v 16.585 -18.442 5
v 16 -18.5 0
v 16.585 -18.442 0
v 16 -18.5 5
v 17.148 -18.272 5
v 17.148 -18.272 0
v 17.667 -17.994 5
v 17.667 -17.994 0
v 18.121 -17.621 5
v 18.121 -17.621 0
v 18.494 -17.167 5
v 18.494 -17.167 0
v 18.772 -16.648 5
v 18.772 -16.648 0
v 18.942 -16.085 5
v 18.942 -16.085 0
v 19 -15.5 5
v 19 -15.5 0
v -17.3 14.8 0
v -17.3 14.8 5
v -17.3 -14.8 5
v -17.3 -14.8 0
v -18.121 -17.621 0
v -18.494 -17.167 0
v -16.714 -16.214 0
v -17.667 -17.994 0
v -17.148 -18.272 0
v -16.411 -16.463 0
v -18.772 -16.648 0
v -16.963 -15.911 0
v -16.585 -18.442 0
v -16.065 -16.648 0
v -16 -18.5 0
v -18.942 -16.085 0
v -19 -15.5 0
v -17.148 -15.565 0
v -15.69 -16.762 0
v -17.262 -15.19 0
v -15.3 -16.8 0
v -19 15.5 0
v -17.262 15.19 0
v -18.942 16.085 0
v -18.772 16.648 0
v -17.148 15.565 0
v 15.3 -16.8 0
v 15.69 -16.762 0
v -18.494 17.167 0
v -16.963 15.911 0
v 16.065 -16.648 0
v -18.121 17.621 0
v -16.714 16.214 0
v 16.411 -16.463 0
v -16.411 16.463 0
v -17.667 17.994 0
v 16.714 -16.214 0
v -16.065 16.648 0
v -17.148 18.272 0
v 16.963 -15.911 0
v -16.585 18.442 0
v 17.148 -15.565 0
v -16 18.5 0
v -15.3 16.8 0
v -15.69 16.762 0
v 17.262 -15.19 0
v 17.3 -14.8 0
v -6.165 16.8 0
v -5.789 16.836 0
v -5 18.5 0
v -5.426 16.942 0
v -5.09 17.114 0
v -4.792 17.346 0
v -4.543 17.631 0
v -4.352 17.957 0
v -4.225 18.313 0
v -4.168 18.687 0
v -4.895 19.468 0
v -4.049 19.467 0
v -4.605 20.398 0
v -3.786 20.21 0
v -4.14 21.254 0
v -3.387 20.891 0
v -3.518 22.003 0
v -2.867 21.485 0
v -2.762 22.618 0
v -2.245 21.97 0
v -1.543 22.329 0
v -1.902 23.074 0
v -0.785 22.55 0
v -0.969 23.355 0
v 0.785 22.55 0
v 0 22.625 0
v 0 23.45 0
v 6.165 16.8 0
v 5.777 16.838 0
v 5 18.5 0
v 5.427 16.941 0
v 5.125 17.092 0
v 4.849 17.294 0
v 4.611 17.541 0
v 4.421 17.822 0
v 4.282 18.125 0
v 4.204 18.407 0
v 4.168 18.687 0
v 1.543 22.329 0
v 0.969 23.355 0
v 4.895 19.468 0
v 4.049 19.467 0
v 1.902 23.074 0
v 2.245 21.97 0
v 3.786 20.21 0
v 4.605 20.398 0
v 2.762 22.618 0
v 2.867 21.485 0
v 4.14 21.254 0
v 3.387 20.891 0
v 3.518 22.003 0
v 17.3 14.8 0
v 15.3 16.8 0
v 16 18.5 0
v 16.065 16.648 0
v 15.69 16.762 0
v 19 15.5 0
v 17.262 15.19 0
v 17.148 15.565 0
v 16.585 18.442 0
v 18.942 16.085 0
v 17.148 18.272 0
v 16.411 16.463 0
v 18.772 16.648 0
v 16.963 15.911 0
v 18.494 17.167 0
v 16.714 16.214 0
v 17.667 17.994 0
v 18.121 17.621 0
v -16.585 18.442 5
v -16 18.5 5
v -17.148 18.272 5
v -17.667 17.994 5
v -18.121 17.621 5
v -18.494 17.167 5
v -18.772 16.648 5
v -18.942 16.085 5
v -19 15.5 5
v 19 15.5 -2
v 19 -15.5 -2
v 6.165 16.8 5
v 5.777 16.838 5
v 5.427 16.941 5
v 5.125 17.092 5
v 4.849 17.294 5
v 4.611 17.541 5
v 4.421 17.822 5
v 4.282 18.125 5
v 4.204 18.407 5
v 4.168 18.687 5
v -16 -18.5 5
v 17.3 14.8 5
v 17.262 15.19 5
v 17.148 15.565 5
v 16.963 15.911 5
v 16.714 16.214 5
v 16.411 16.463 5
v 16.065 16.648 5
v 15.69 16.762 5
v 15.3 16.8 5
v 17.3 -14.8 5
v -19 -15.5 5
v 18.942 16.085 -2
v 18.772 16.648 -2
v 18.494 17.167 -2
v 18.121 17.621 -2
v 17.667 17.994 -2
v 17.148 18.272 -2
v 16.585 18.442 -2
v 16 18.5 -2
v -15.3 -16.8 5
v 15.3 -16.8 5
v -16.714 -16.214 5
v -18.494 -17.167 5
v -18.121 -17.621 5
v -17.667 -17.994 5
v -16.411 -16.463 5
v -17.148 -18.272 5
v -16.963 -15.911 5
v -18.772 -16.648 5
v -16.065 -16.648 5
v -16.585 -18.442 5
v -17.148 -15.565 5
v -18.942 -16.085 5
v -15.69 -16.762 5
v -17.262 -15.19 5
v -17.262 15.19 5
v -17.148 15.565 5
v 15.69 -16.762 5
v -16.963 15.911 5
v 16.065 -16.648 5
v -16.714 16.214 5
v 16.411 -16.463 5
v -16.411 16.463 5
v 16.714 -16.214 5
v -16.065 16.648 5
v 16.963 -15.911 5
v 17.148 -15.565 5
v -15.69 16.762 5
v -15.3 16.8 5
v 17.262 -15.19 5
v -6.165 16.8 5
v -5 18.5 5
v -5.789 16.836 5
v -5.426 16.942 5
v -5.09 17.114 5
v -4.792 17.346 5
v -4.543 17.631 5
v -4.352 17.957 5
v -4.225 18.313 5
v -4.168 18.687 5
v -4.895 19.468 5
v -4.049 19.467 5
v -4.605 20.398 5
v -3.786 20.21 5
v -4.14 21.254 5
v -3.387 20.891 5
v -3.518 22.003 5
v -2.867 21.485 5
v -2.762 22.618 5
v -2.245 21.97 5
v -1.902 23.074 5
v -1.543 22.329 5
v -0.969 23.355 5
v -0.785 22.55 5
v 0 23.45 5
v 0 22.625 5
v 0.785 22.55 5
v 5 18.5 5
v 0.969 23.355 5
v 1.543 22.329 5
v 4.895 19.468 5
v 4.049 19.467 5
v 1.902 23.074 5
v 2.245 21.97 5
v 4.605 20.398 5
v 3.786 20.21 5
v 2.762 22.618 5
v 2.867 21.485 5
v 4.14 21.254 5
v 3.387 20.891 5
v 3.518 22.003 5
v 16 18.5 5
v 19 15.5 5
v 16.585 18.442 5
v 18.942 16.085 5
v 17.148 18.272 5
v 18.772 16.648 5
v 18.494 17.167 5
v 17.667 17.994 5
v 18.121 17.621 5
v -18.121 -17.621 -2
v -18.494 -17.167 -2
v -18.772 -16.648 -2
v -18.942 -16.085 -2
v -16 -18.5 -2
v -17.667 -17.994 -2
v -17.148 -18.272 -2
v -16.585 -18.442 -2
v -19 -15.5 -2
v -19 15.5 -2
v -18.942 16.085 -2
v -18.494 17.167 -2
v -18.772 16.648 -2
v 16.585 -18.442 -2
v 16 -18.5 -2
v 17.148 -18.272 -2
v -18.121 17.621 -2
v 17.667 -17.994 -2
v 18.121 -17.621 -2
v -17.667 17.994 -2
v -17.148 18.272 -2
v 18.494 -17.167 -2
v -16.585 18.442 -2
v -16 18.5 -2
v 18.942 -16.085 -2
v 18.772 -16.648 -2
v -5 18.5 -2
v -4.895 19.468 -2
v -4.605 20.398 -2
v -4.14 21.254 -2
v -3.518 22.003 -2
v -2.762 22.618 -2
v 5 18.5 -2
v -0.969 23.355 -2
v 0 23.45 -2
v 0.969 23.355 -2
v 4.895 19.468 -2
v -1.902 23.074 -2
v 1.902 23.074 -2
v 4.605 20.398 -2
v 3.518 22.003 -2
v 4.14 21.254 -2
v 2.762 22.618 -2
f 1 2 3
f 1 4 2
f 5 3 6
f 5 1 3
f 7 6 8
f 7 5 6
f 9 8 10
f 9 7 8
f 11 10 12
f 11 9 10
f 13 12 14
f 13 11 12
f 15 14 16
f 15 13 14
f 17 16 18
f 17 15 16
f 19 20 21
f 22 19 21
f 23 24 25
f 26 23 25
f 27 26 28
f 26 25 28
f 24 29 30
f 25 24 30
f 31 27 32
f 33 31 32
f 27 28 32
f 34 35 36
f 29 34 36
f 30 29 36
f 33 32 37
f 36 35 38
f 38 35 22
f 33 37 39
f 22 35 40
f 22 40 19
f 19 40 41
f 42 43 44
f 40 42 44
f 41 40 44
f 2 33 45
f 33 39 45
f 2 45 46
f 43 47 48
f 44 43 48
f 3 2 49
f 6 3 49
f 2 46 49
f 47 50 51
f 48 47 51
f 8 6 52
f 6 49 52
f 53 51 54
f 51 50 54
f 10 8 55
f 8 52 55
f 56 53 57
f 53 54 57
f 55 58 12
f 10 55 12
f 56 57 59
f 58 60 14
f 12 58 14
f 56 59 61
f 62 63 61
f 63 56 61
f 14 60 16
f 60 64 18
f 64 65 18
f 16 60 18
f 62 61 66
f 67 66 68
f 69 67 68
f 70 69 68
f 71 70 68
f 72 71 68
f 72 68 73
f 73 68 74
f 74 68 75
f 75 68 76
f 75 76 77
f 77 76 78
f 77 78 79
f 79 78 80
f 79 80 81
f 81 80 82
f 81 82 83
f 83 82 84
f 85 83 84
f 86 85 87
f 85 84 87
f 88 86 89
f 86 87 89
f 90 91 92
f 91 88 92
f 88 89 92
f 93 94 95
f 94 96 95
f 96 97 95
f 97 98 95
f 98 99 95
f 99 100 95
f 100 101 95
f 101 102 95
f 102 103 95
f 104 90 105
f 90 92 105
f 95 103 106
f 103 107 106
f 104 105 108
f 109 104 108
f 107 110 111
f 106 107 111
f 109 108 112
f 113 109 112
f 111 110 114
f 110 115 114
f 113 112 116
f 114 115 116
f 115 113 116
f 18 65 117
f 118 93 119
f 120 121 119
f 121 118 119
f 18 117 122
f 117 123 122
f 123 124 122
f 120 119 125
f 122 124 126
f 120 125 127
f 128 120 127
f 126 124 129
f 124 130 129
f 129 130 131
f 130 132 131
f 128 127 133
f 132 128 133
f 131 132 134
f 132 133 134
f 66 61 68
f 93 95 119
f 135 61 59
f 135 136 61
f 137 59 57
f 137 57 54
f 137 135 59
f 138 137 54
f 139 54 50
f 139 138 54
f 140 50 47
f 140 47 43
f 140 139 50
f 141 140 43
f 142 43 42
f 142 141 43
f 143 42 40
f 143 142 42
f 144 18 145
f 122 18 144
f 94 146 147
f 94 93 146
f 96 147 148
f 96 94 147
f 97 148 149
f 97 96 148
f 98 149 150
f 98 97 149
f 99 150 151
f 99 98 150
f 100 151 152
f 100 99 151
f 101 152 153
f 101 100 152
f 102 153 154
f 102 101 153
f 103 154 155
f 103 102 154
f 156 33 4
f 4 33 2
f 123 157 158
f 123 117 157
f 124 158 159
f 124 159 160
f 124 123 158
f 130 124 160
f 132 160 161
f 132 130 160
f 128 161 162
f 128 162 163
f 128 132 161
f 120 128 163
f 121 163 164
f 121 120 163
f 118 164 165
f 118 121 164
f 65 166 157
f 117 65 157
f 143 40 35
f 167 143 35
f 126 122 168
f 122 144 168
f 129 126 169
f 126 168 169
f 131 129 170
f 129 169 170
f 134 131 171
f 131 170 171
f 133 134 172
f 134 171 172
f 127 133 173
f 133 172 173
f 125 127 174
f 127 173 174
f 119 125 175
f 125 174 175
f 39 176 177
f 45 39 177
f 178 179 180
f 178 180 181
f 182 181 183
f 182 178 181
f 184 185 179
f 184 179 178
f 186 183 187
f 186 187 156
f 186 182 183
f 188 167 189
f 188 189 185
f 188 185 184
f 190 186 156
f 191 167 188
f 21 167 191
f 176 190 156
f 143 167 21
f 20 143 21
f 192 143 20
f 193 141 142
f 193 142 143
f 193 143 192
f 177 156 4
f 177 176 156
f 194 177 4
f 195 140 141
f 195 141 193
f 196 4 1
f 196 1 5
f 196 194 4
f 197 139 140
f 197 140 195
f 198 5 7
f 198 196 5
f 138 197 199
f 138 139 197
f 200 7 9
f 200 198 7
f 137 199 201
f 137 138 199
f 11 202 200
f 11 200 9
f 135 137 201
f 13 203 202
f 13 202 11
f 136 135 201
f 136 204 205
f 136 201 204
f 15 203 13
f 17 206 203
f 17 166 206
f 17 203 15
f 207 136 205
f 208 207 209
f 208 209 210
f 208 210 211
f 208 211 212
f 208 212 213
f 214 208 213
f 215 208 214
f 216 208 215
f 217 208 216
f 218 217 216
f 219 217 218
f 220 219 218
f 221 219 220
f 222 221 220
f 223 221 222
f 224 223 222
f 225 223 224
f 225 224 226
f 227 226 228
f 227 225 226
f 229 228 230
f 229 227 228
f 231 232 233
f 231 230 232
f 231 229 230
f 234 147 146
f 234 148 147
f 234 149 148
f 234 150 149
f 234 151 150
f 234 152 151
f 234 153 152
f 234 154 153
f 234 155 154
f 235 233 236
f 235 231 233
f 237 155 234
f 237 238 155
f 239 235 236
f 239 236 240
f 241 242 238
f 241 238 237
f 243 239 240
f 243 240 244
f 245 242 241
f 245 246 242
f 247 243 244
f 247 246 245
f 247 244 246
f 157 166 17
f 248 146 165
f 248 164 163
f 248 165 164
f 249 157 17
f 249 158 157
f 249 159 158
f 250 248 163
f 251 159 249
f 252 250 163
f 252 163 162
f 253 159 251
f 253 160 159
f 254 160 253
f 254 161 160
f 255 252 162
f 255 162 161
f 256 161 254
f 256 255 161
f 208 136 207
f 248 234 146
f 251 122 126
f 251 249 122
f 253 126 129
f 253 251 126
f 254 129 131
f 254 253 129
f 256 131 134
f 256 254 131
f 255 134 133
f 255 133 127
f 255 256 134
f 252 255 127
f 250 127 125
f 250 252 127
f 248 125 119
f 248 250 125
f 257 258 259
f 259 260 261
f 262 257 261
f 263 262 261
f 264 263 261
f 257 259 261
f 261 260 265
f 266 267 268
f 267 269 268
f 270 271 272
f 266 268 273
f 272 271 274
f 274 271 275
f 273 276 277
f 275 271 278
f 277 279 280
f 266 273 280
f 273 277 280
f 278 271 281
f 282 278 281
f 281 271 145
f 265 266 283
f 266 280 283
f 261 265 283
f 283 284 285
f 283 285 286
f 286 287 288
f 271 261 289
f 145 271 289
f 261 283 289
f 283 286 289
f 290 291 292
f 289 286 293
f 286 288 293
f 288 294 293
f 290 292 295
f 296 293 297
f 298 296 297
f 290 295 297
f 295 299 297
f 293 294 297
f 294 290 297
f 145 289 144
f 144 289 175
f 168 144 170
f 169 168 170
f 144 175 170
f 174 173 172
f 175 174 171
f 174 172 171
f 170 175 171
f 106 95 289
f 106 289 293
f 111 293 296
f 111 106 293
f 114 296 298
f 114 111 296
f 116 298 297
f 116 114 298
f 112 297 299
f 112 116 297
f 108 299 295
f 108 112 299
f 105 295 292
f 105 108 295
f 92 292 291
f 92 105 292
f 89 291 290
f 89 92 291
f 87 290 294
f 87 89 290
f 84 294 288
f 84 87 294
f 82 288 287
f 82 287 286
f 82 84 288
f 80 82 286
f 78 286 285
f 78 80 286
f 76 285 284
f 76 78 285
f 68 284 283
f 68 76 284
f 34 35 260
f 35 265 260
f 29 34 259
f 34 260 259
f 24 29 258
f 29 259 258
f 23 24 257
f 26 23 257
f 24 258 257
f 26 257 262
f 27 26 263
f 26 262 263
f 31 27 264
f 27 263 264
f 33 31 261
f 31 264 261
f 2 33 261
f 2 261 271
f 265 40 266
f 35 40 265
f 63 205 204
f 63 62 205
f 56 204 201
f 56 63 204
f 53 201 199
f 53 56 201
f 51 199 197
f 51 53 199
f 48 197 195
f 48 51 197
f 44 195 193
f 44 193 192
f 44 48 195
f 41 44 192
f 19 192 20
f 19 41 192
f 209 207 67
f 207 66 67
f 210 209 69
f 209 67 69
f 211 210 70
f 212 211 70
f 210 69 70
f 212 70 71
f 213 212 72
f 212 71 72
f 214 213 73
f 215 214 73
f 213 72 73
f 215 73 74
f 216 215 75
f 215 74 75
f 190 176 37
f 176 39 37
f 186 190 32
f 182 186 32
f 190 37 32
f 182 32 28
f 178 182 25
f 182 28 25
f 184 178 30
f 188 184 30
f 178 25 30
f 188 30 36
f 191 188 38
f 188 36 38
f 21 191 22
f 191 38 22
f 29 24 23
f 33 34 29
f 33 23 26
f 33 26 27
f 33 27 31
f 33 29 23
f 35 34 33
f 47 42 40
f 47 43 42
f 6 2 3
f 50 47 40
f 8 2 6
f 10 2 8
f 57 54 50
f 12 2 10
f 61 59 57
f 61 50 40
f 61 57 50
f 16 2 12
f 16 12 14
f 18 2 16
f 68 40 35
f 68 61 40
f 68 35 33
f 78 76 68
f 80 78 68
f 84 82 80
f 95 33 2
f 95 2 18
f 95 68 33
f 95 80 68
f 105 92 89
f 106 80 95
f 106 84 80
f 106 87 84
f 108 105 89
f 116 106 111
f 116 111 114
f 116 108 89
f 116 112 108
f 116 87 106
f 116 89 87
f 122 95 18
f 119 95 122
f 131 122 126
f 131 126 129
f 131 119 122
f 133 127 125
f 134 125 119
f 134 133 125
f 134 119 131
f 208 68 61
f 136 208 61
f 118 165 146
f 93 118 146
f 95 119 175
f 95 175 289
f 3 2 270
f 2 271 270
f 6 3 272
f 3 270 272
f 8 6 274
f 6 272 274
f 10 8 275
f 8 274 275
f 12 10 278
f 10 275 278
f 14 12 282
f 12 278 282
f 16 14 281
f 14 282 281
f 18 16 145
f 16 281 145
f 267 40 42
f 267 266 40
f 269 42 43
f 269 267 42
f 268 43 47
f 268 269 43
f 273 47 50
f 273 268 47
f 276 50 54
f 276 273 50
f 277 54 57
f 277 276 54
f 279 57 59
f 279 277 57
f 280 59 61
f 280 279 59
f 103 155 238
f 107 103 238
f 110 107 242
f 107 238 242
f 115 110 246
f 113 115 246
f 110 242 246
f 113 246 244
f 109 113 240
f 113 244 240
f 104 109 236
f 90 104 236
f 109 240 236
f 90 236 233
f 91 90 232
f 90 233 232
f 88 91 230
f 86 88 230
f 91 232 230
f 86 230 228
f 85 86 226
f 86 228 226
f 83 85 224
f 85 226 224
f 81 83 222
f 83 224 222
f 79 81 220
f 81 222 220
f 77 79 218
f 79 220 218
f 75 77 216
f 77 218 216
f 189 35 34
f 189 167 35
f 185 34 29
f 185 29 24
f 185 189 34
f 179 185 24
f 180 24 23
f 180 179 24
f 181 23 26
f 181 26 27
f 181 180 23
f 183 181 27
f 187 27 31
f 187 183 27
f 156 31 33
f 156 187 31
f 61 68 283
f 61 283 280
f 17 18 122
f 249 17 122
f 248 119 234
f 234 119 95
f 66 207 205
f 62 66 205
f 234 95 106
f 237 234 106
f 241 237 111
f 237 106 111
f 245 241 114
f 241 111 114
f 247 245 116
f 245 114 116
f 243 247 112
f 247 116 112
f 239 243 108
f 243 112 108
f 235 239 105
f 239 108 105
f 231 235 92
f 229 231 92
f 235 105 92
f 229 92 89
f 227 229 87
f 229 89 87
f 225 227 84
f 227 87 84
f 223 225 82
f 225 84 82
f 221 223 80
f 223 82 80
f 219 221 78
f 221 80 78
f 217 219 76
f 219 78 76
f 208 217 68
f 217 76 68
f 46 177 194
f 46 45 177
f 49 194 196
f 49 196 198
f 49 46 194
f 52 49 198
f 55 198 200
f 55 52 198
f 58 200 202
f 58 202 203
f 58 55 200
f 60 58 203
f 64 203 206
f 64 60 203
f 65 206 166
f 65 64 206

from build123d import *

# Parameters (mm, degrees)
F1_DEPTH = 2
F2_DEPTH = 5
F4_R     = 3
F4_2_R   = 3
F5_DEPTH = 5
F6_R     = 2
F7_R     = 2


with BuildPart() as f1:
    # F0 (on Top) → F1 (new body)
    with BuildSketch(Plane.XY):
        with BuildLine():
            Line((16, 15.5), (16, -15.5))
            Line((16, -15.5), (-16, -15.5))
            Line((-16, -15.5), (-16, 15.5))
            Line((-16, 15.5), (-4.0370162249, 15.5))
            ThreePointArc((-4.0370162249, 15.5), (-4.7608597882, 16.9221865044), (-4.9997499937, 18.5))
            Line((-4.9997499937, 18.5), (-19, 18.5))
            Line((-19, 18.5), (-19, -18.5))
            Line((-19, -18.5), (19, -18.5))
            Line((19, -18.5), (19, 18.5))
            Line((19, 18.5), (4.9997499937, 18.5))
            ThreePointArc((4.9997499937, 18.5), (4.999937498, 18.4750003125), (5, 18.45))
            ThreePointArc((5, 18.45), (4.7531611126, 16.8984010061), (4.0370162249, 15.5))
            Line((4.0370162249, 15.5), (16, 15.5))
        make_face()
        with BuildLine():
            Line((-16, -15.5), (16, -15.5))
            Line((16, -15.5), (16, 15.5))
            Line((16, 15.5), (4.0370162249, 15.5))
            ThreePointArc((4.0370162249, 15.5), (0, 13.45), (-4.0370162249, 15.5))
            Line((-4.0370162249, 15.5), (-16, 15.5))
            Line((-16, 15.5), (-16, -15.5))
        make_face()
        with BuildLine():
            ThreePointArc((-4.0370162249, 15.5), (0, 13.45), (4.0370162249, 15.5))
            Line((4.0370162249, 15.5), (1.6395502432, 15.5))
            ThreePointArc((1.6395502432, 15.5), (0, 15.075), (-1.6395502432, 15.5))
            Line((-1.6395502432, 15.5), (-4.0370162249, 15.5))
        make_face()
        with BuildLine():
            Line((1.6395502432, 15.5), (4.0370162249, 15.5))
            ThreePointArc((4.0370162249, 15.5), (4.7531611126, 16.8984010061), (5, 18.45))
            ThreePointArc((5, 18.45), (4.999937498, 18.4750003125), (4.9997499937, 18.5))
            Line((4.9997499937, 18.5), (3.3746296093, 18.5))
            ThreePointArc((3.3746296093, 18.5), (3.3749074011, 18.4750006859), (3.375, 18.45))
            ThreePointArc((3.375, 18.45), (2.908960903, 16.7386930537), (1.6395502432, 15.5))
        make_face()
        with BuildLine():
            ThreePointArc((-4.9997499937, 18.5), (-4.7608597882, 16.9221865044), (-4.0370162249, 15.5))
            Line((-4.0370162249, 15.5), (-1.6395502432, 15.5))
            ThreePointArc((-1.6395502432, 15.5), (-2.9215577862, 16.7602884561), (-3.3746296093, 18.5))
            Line((-3.3746296093, 18.5), (-4.9997499937, 18.5))
        make_face()
        with BuildLine():
            ThreePointArc((-1.6395502432, 15.5), (0, 15.075), (1.6395502432, 15.5))
            Line((1.6395502432, 15.5), (-1.6395502432, 15.5))
        make_face()
        with BuildLine():
            Line((-1.6395502432, 15.5), (1.6395502432, 15.5))
            ThreePointArc((1.6395502432, 15.5), (2.908960903, 16.7386930537), (3.375, 18.45))
            ThreePointArc((3.375, 18.45), (3.3749074011, 18.4750006859), (3.3746296093, 18.5))
            Line((3.3746296093, 18.5), (-3.3746296093, 18.5))
            ThreePointArc((-3.3746296093, 18.5), (-2.9215577862, 16.7602884561), (-1.6395502432, 15.5))
        make_face()
        with BuildLine():
            ThreePointArc((4.9997499937, 18.5), (0, 23.45), (-4.9997499937, 18.5))
            Line((-4.9997499937, 18.5), (-3.3746296093, 18.5))
            ThreePointArc((-3.3746296093, 18.5), (0, 21.825), (3.3746296093, 18.5))
            Line((3.3746296093, 18.5), (4.9997499937, 18.5))
        make_face()
        with BuildLine():
            ThreePointArc((3.3746296093, 18.5), (0, 21.825), (-3.3746296093, 18.5))
            Line((-3.3746296093, 18.5), (3.3746296093, 18.5))
        make_face()
    extrude(amount=-F1_DEPTH)

    # F4
    f4_edges = [f1.edges().sort_by_distance(p)[0] for p in [
        (-19, -18.5, -1),
        (19, -18.5, -1),
        (19, 18.5, -1),
        (-19, 18.5, -1),
    ]]
    fillet(f4_edges, radius=F4_R)


with BuildPart() as f2:
    # F0 (on Top) → F2 (new body)
    with BuildSketch(Plane.XY):
        with BuildLine():
            ThreePointArc((4.9997499937, 18.5), (0, 23.45), (-4.9997499937, 18.5))
            Line((-4.9997499937, 18.5), (-3.3746296093, 18.5))
            ThreePointArc((-3.3746296093, 18.5), (0, 21.825), (3.3746296093, 18.5))
            Line((3.3746296093, 18.5), (4.9997499937, 18.5))
        make_face()
        with BuildLine():
            Line((16, 15.5), (16, -15.5))
            Line((16, -15.5), (-16, -15.5))
            Line((-16, -15.5), (-16, 15.5))
            Line((-16, 15.5), (-4.0370162249, 15.5))
            ThreePointArc((-4.0370162249, 15.5), (-4.7608597882, 16.9221865044), (-4.9997499937, 18.5))
            Line((-4.9997499937, 18.5), (-19, 18.5))
            Line((-19, 18.5), (-19, -18.5))
            Line((-19, -18.5), (19, -18.5))
            Line((19, -18.5), (19, 18.5))
            Line((19, 18.5), (4.9997499937, 18.5))
            ThreePointArc((4.9997499937, 18.5), (4.999937498, 18.4750003125), (5, 18.45))
            ThreePointArc((5, 18.45), (4.7531611126, 16.8984010061), (4.0370162249, 15.5))
            Line((4.0370162249, 15.5), (16, 15.5))
        make_face()
        with BuildLine():
            Line((1.6395502432, 15.5), (4.0370162249, 15.5))
            ThreePointArc((4.0370162249, 15.5), (4.7531611126, 16.8984010061), (5, 18.45))
            ThreePointArc((5, 18.45), (4.999937498, 18.4750003125), (4.9997499937, 18.5))
            Line((4.9997499937, 18.5), (3.3746296093, 18.5))
            ThreePointArc((3.3746296093, 18.5), (3.3749074011, 18.4750006859), (3.375, 18.45))
            ThreePointArc((3.375, 18.45), (2.908960903, 16.7386930537), (1.6395502432, 15.5))
        make_face()
        with BuildLine():
            ThreePointArc((-4.9997499937, 18.5), (-4.7608597882, 16.9221865044), (-4.0370162249, 15.5))
            Line((-4.0370162249, 15.5), (-1.6395502432, 15.5))
            ThreePointArc((-1.6395502432, 15.5), (-2.9215577862, 16.7602884561), (-3.3746296093, 18.5))
            Line((-3.3746296093, 18.5), (-4.9997499937, 18.5))
        make_face()
    extrude(amount=F2_DEPTH)

    # F4#2
    f4_2_edges = [f2.edges().sort_by_distance(p)[0] for p in [
        (19, 18.5, 2.5),
        (-19, 18.5, 2.5),
        (19, -18.5, 2.5),
        (-19, -18.5, 2.5),
    ]]
    fillet(f4_2_edges, radius=F4_2_R)

    # F3 (on face) → F5 (cut)
    with BuildSketch(Plane.XY.offset(5)):
        with BuildLine():
            Line((-17.3, -16.8), (17.3, -16.8))
            Line((17.3, -16.8), (17.3, 16.8))
            Line((17.3, 16.8), (3.8351173385, 16.8))
            ThreePointArc((3.8351173385, 16.8), (0, 14.275), (-3.8351173385, 16.8))
            Line((-3.8351173385, 16.8), (-17.3, 16.8))
            Line((-17.3, 16.8), (-17.3, -16.8))
        make_face()
        with BuildLine():
            ThreePointArc((-3.8351173385, 16.8), (0, 14.275), (3.8351173385, 16.8))
            Line((3.8351173385, 16.8), (-3.8351173385, 16.8))
        make_face()
        with BuildLine():
            Line((-3.8351173385, 16.8), (3.8351173385, 16.8))
            ThreePointArc((3.8351173385, 16.8), (4.0891466034, 17.6076787692), (4.175, 18.45))
            ThreePointArc((4.175, 18.45), (-0.8423212308, 22.5391466034), (-3.8351173385, 16.8))
        make_face()
    extrude(amount=-F5_DEPTH, mode=Mode.SUBTRACT)

    # F6
    f6_edges = [f2.edges().sort_by_distance(p)[0] for p in [
        (-17.3, 16.8, 2.5),
        (17.3, 16.8, 2.5),
        (17.3, -16.8, 2.5),
        (-17.3, -16.8, 2.5),
    ]]
    fillet(f6_edges, radius=F6_R)

    # F7
    f7_edges = [f2.edges().sort_by_distance(p)[0] for p in [
        (-3.835117, 16.8, 2.5),
        (3.835117, 16.8, 2.5),
    ]]
    fillet(f7_edges, radius=F7_R)


solid = Compound([f1.part, f2.part])
